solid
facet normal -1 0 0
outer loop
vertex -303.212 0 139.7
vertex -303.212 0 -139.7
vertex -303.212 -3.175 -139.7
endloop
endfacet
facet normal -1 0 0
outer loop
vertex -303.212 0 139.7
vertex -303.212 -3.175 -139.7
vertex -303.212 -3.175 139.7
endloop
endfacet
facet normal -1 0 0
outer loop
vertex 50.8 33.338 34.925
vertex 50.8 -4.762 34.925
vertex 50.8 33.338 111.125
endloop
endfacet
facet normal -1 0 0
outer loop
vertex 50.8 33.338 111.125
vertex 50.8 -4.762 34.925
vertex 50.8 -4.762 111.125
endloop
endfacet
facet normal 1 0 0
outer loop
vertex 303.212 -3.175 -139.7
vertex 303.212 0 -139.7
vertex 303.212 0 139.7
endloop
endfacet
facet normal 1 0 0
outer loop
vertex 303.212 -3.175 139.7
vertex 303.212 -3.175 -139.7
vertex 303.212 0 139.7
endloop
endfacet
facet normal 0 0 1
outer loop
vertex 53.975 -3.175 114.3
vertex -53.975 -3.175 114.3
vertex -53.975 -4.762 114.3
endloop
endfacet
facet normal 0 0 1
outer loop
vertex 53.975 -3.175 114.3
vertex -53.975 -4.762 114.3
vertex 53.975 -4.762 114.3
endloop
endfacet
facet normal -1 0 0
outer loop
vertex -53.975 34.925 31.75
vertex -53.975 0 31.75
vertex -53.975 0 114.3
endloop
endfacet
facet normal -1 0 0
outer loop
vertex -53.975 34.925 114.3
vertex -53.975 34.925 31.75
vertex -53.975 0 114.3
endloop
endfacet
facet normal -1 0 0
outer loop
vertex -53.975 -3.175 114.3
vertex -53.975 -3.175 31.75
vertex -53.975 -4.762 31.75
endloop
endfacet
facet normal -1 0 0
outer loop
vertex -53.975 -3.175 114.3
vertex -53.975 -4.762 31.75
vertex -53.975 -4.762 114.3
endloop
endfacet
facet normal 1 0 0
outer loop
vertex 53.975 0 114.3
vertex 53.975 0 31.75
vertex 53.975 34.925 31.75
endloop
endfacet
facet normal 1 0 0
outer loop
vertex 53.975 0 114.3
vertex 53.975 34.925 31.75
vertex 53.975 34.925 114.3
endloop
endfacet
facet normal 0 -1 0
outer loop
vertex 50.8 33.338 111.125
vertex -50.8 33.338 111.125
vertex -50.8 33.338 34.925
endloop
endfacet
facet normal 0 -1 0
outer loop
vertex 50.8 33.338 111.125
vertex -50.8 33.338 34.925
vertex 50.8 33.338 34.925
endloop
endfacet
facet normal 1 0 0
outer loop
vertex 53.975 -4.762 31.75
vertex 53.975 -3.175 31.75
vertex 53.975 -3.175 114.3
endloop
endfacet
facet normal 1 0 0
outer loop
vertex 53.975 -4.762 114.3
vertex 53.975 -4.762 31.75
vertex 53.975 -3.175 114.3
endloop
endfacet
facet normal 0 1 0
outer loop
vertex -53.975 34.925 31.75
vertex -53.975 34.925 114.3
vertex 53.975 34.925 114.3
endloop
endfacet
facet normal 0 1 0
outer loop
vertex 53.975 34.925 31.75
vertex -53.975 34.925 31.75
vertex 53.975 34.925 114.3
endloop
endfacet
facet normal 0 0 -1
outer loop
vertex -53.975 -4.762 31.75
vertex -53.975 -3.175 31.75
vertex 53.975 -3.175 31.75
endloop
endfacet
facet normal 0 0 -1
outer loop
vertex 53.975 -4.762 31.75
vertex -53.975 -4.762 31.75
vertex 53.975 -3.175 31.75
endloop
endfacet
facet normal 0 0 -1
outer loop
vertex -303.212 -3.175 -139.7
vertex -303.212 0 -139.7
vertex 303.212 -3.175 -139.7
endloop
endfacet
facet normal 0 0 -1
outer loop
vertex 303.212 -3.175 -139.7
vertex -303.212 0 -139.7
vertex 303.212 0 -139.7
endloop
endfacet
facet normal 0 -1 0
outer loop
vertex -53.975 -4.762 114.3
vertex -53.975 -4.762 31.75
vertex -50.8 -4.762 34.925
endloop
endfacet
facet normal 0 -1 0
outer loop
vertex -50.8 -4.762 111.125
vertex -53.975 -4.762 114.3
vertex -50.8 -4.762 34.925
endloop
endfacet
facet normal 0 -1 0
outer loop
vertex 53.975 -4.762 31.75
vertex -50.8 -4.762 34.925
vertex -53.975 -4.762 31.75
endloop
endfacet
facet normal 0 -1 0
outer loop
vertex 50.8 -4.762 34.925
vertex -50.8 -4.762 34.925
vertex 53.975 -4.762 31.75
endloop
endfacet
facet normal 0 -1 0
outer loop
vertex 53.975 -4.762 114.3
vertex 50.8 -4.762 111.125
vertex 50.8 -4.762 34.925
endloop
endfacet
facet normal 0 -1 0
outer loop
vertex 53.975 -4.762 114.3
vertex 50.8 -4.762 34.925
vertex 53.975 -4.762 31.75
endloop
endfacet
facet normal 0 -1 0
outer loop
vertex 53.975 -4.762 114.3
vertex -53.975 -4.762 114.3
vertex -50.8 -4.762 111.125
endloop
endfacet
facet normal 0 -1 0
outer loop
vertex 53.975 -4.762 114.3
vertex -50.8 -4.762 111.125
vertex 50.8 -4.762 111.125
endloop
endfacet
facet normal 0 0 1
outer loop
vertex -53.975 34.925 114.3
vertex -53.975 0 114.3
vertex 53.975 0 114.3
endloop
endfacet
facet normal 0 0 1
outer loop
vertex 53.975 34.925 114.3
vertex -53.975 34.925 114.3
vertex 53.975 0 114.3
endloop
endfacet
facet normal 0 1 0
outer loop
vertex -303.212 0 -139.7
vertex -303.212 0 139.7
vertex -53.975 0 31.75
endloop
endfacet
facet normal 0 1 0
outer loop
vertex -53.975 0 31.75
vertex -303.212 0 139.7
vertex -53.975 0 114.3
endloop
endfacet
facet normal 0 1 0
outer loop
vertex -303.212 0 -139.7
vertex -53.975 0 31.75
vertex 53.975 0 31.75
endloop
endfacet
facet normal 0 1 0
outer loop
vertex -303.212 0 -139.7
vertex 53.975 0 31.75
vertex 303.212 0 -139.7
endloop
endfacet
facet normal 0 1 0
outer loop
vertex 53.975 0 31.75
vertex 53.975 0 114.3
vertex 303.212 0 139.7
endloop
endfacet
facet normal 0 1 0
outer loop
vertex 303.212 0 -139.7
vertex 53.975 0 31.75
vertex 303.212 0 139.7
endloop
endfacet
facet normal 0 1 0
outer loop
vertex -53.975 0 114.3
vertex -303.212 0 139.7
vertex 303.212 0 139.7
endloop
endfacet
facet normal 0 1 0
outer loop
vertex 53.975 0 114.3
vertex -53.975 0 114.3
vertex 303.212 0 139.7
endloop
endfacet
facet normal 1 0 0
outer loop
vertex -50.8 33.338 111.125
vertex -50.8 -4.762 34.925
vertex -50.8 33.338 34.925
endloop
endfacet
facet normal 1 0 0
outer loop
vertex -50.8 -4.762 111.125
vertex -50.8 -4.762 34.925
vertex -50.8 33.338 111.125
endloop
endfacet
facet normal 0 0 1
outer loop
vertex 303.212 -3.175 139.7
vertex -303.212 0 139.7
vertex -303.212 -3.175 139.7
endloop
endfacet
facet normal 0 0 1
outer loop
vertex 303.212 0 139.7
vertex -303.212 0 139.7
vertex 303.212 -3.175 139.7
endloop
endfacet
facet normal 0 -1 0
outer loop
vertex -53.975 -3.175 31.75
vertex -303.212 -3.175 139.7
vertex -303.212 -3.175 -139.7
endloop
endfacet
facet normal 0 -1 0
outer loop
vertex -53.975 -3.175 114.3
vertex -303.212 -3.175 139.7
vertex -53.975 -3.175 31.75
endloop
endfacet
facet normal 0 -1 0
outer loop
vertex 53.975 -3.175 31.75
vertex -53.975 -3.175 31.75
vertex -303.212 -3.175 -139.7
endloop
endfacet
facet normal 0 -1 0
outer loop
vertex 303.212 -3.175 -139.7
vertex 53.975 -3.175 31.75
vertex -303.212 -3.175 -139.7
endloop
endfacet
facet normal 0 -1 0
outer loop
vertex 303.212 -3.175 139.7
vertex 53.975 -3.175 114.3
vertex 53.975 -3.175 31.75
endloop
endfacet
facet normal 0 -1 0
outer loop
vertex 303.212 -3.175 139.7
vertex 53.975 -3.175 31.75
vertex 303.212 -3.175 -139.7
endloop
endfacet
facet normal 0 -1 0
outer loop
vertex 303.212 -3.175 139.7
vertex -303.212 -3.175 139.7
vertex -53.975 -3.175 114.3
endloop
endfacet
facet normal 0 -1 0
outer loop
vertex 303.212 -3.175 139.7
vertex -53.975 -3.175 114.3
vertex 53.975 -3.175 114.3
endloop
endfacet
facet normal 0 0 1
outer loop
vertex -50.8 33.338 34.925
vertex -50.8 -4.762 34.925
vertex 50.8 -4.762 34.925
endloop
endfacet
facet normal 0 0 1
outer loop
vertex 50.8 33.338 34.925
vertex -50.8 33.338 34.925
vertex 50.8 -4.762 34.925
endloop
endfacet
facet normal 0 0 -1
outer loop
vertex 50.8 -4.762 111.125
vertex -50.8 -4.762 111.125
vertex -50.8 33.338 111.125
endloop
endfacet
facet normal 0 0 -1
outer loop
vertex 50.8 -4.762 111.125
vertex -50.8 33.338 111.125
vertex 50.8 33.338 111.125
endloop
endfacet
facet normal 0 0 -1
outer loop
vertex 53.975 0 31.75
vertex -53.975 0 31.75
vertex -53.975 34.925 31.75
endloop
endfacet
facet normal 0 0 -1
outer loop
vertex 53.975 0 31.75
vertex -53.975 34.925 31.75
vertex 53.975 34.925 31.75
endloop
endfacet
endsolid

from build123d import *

# Parameters (mm, degrees)
F0_W     = 606.425
F0_H     = 279.4
F1_DEPTH = 3.175
F2_W     = 107.95
F2_H     = 82.55
F3_DEPTH = 38.1
F4_DEPTH = 1.5875
F5_W     = 101.6
F5_H     = 76.2
F6_DEPTH = 38.1


with BuildPart() as f1:
    # F0 (on Front) → F1 (new body)
    with BuildSketch(Plane.XZ):
        Rectangle(F0_W, F0_H)
    extrude(amount=F1_DEPTH)

    # F2 (on face) → F3 (join)
    with BuildSketch(Plane.XZ.offset(3.175)):
        with Locations((0, 73.025)):
            Rectangle(F2_W, F2_H)
    extrude(amount=-F3_DEPTH)

    # F2 (on face) → F4 (join)
    with BuildSketch(Plane.XZ.offset(3.175)):
        with Locations((0, 73.025)):
            Rectangle(F2_W, F2_H)
    extrude(amount=F4_DEPTH)

    # F5 (on face) → F6 (cut)
    with BuildSketch(Plane.XZ.offset(4.7625)):
        with Locations((0, 73.025)):
            Rectangle(F5_W, F5_H)
    extrude(amount=-F6_DEPTH, mode=Mode.SUBTRACT)


solid = f1.part
